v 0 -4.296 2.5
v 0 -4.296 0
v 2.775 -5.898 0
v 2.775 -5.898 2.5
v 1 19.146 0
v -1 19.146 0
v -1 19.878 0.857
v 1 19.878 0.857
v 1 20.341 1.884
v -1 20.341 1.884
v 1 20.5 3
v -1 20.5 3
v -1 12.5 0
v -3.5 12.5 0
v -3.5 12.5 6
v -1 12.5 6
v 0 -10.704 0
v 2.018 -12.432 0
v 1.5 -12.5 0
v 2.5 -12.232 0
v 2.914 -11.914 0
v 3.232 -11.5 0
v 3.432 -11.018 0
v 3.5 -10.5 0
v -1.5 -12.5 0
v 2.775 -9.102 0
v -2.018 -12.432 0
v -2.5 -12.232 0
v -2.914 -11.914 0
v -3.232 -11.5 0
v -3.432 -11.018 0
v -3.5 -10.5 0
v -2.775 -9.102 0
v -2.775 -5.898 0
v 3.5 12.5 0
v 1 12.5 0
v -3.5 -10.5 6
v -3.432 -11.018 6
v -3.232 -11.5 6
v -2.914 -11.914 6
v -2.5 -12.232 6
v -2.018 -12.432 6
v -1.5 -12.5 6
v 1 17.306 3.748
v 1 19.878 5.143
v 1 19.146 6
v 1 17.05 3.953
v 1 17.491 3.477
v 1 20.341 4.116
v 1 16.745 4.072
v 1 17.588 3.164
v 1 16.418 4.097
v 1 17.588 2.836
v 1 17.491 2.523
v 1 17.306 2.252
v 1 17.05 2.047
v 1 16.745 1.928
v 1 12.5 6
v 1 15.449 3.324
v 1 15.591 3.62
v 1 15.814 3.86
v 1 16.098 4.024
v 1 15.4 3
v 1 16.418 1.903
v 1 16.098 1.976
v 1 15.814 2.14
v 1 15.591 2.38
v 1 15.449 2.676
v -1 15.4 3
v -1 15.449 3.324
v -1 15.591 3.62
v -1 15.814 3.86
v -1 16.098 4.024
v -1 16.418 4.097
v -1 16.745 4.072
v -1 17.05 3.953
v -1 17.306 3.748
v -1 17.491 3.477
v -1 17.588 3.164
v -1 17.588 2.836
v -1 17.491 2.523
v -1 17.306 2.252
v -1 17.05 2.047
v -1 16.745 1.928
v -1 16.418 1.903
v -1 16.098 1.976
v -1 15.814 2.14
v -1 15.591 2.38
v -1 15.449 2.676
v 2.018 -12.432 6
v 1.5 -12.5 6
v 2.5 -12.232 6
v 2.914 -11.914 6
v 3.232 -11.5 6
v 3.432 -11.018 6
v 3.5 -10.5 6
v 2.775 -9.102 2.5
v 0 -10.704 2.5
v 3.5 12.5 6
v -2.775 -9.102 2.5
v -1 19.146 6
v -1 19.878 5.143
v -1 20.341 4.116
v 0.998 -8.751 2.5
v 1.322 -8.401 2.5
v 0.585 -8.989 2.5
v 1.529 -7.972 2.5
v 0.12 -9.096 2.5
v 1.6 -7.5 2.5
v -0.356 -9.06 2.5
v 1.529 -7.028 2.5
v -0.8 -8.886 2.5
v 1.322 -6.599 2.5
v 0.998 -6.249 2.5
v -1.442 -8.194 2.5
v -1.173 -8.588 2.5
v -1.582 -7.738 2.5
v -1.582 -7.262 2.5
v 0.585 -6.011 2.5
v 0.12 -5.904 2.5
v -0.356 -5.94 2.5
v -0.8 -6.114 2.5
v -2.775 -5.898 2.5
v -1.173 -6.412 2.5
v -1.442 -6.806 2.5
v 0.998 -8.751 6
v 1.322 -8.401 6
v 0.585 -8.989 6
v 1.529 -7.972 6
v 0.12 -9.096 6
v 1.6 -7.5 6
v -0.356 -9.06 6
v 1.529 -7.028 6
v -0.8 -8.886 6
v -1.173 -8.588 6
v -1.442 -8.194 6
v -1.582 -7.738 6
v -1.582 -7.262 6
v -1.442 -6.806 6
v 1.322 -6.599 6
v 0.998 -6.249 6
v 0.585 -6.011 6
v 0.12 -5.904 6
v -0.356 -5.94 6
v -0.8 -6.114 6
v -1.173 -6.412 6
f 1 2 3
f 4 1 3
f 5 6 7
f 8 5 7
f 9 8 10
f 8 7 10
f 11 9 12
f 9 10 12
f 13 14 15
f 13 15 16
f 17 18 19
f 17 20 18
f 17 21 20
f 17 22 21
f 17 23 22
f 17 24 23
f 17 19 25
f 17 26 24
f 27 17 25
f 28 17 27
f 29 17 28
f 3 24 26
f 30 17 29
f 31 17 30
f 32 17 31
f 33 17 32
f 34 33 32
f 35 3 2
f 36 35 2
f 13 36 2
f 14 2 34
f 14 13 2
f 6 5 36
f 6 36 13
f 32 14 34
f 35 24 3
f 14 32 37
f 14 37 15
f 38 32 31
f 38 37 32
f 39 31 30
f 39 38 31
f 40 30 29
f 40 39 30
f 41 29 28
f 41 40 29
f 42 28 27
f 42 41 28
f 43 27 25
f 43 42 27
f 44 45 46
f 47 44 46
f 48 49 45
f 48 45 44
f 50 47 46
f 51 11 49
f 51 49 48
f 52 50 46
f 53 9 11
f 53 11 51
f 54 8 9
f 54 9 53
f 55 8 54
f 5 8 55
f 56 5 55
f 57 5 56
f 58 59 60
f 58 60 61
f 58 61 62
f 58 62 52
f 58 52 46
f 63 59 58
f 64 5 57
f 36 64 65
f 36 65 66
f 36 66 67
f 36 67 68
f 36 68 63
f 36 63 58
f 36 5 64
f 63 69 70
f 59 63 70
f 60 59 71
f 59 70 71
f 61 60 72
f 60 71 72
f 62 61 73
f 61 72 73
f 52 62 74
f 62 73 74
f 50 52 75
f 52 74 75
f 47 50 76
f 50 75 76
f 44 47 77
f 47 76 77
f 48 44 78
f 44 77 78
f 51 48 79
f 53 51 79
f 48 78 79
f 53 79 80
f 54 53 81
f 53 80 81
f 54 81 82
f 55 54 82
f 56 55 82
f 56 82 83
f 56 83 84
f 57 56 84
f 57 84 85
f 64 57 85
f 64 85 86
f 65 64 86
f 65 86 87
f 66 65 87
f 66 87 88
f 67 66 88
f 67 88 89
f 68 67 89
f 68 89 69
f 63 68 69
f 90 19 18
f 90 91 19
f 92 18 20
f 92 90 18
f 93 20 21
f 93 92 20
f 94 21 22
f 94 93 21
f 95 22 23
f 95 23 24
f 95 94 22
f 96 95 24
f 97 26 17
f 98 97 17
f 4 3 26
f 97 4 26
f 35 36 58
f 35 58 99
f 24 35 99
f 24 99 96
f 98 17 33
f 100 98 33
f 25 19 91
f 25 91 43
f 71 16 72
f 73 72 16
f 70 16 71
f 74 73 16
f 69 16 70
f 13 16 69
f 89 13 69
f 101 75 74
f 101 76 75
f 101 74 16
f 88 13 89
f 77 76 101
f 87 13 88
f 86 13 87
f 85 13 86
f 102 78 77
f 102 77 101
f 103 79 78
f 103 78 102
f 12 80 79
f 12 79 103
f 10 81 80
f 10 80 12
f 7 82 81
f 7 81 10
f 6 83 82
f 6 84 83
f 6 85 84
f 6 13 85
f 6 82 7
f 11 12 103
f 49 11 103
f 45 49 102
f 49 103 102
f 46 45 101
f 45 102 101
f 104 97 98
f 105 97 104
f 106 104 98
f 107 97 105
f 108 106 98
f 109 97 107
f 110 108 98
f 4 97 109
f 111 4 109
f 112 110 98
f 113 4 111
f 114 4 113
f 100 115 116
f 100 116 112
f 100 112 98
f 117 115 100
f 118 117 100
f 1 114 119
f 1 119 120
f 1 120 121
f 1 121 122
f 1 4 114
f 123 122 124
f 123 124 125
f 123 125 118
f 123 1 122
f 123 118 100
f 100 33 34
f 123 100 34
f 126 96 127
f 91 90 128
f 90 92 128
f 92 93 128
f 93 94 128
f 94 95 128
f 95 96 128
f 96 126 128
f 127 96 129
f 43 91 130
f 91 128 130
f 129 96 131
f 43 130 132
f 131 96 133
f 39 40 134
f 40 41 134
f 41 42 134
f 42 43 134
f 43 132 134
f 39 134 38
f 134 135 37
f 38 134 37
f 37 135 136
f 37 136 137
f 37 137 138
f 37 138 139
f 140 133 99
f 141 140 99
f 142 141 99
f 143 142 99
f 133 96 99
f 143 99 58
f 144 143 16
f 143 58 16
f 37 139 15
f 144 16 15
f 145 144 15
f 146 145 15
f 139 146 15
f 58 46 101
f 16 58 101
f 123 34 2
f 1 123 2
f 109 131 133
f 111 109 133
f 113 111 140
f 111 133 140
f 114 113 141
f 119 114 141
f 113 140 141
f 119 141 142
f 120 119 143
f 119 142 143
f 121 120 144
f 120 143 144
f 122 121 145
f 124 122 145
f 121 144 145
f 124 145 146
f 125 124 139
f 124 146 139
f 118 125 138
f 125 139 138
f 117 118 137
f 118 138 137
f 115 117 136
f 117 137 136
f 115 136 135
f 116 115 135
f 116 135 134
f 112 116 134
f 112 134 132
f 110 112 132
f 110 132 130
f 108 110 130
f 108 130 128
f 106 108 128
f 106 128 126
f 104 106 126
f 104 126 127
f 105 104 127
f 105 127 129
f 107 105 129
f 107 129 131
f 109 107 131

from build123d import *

# Parameters (mm, degrees)
BOSS_EXTRUDE1_DEPTH = 6
SKETCH2_R           = 1.6
CUT_EXTRUDE1_DEPTH  = 22.644860822
CUT_EXTRUDE2_DEPTH  = 2.5
SKETCH4_R           = 1.1
CUT_EXTRUDE3_DEPTH  = 22.828879953
CUT_EXTRUDE4_DEPTH  = 22.828879953
FILLET1_R           = 2


with BuildPart() as part:
    # Sketch1 → Boss-Extrude1 (new body)
    with BuildSketch(Plane.XY):
        Polygon((-1, 12.5), (-1, 20.5), (1, 20.5), (1, 12.5), (3.5, 12.5), (3.5, -12.5), (-3.5, -12.5), (-3.5, 12.5), align=None)
    extrude(amount=BOSS_EXTRUDE1_DEPTH)

    # Sketch2 → Cut-Extrude1 (cut, through all)
    with BuildSketch(Plane.XY.offset(6)):
        with Locations((0, -7.5)):
            Circle(SKETCH2_R)
    extrude(amount=-CUT_EXTRUDE1_DEPTH, mode=Mode.SUBTRACT)

    # Sketch3 → Cut-Extrude2 (cut)
    with BuildSketch(Plane(origin=(0, 0, 0), x_dir=(-1, 0, 0), z_dir=(0, 0, -1))):
        Polygon((0, -4.295706006), (-2.775, -5.897853003), (-2.775, -9.102146997), (0, -10.704293994), (2.775, -9.102146997), (2.775, -5.897853003), align=None)
    extrude(amount=-CUT_EXTRUDE2_DEPTH, mode=Mode.SUBTRACT)

    # Sketch4 → Cut-Extrude3 (cut, through all)
    with BuildSketch(Plane.ZY.offset(1)):
        with Locations(Location((3, 16.5, 0), (0, 0, 270))):
            Circle(SKETCH4_R)
    extrude(amount=-CUT_EXTRUDE3_DEPTH, mode=Mode.SUBTRACT)

    # Sketch5 → Cut-Extrude4 (cut, through all)
    with BuildSketch(Plane.ZY.offset(1)):
        with BuildLine():
            Line((6, 20.5), (3, 20.5))
            ThreePointArc((3, 20.5), (4.645751311, 20.145751311), (6, 19.145751311))
            Line((6, 19.145751311), (6, 20.5))
        make_face()
        with BuildLine():
            Line((0, 20.5), (0, 19.145751311))
            ThreePointArc((0, 19.145751311), (1.354248689, 20.145751311), (3, 20.5))
            Line((3, 20.5), (0, 20.5))
        make_face()
    extrude(amount=-CUT_EXTRUDE4_DEPTH, mode=Mode.SUBTRACT)

    # Fillet1
    fillet1_edges = [part.edges().sort_by_distance(p)[0] for p in [
        (3.5, -12.5, 3),
        (-3.5, -12.5, 3),
    ]]
    fillet(fillet1_edges, radius=FILLET1_R)


solid = part.part
